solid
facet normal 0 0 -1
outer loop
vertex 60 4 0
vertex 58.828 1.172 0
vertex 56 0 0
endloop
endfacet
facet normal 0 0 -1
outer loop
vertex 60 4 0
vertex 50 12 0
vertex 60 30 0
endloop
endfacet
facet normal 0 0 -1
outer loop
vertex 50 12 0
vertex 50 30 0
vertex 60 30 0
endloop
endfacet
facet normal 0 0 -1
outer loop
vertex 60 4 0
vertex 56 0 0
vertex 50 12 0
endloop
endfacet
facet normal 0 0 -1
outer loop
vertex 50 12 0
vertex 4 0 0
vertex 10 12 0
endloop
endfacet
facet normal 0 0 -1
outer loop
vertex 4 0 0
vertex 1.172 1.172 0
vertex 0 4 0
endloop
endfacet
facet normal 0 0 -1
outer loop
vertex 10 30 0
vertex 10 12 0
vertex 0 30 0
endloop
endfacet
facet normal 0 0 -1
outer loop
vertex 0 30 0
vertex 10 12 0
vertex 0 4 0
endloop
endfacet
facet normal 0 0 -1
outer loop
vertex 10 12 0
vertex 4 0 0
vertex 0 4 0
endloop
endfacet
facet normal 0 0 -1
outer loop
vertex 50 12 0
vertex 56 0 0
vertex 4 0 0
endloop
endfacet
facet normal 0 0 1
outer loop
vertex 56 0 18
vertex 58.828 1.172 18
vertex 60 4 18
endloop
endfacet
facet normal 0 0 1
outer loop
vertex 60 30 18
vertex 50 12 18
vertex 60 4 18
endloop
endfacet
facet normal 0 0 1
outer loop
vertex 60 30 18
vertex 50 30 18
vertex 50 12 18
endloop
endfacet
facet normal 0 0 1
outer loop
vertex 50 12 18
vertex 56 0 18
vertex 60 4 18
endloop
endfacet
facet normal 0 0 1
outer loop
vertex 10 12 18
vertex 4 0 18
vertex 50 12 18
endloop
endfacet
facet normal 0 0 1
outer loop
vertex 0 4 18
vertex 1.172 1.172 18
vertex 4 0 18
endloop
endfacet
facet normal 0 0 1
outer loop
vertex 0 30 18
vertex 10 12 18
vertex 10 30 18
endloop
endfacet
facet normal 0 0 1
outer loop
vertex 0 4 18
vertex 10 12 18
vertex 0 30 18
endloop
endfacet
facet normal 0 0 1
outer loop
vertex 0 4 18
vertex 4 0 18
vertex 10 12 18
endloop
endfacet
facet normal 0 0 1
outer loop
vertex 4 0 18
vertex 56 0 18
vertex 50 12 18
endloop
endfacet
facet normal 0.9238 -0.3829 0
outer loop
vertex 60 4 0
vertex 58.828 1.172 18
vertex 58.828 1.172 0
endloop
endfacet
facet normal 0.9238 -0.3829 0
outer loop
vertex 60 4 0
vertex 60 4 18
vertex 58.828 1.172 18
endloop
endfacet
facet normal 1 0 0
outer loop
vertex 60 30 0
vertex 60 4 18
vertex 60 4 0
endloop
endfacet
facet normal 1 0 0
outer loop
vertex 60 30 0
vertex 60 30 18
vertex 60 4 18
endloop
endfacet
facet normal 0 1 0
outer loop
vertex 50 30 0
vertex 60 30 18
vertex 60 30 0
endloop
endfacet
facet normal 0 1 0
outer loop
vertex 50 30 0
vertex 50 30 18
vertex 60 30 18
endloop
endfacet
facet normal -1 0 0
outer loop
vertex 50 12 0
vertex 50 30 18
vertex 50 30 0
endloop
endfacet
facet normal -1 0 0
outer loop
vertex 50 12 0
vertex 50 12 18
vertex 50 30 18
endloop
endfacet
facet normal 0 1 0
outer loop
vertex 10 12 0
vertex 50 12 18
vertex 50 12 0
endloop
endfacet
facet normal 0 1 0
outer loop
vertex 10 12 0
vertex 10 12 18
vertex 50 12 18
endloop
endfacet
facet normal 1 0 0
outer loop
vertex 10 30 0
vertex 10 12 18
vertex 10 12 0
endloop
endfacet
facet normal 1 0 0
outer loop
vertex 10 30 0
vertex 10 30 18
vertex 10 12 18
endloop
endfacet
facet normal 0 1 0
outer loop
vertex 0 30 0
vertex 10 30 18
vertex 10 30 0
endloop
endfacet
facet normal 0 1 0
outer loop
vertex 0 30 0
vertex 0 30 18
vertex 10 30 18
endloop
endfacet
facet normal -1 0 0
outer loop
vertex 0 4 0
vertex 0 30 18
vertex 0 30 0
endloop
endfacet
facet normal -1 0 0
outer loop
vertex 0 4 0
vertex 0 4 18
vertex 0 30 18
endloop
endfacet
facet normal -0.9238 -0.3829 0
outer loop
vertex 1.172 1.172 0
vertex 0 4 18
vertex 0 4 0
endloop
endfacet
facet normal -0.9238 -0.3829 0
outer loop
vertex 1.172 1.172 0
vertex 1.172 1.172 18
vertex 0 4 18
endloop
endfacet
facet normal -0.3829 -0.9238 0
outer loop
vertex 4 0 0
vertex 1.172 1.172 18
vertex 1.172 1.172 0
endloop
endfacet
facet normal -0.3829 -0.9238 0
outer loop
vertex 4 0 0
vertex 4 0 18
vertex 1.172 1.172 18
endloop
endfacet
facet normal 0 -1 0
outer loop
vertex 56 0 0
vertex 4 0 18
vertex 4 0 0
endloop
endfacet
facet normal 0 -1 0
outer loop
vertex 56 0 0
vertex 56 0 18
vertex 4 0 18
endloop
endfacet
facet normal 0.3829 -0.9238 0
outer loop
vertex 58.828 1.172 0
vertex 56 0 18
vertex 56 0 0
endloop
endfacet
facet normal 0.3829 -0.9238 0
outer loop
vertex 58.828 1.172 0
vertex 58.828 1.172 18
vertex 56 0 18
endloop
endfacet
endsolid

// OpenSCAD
$fn = 32;

// ----------------------------------------------------------------------
// Heat sink frame: 60 x 30 mm frame, 10 mm walls
// ----------------------------------------------------------------------

// --- parameters (mm) ---
profile_height = 18;      // extrusion height
profile_points = 12;      // points of the closed outline

profile = [[0, 4], [1.172, 1.172], [4, 0], [56, 0], [58.828, 1.172], [60, 4], [60, 30], [50, 30], [50, 12], [10, 12], [10, 30], [0, 30]];  // single closed polygon, 12 points, counter clockwise

// --- the one profile operation ---
linear_extrude(height = profile_height) polygon(points = profile);
